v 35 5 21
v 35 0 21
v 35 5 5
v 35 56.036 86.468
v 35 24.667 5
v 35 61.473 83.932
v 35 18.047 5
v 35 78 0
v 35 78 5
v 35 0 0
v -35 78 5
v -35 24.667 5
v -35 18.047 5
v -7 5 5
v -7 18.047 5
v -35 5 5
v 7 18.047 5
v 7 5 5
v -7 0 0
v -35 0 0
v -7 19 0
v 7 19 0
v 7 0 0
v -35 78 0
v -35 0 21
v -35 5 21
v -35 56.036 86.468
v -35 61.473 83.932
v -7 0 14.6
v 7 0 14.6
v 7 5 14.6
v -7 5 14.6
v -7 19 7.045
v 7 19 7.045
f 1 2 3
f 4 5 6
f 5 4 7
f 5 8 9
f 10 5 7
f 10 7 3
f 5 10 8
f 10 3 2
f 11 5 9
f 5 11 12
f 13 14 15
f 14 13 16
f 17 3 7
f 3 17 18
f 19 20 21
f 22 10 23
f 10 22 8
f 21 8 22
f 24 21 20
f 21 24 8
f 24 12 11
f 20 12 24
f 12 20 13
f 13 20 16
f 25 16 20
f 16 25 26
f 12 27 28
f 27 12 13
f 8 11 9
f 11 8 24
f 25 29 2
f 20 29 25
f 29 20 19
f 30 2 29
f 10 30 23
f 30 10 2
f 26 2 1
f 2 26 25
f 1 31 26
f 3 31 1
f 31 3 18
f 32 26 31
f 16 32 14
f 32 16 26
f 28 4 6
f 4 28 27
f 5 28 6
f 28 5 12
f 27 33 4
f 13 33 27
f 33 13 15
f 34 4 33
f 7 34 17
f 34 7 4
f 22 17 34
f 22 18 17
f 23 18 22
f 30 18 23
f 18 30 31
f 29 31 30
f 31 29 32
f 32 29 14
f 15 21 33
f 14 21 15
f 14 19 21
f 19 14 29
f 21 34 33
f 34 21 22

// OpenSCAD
// phone_stand/model.scad — L-profile desk stand: base + front lip + leaning
// back rest, with a cable slot through the lip. Print flat on the base.

w = 70;
depth = 78;
tilt = 65;           // degrees from horizontal; 90 = upright
rest_h = 90;
phone_th = 13;
lip_h = 16;
base_th = 5;
slot_w = 14;
lip_th = 5;
rest_th = 6;

$fn = 48;

// The phone leans on the rest, sitting in the slot between lip and rest.
rest_y = lip_th + phone_th;    // front face of the back rest at base level

module base() {
  translate([-w/2, 0, 0])
    cube([w, depth, base_th]);
}

module lip() {
  translate([-w/2, 0, 0])
    cube([w, lip_th, base_th + lip_h]);
}

module back_rest() {
  translate([0, rest_y, base_th - 0.1])
    rotate([tilt - 90, 0, 0])       // lean the top backwards
      translate([-w/2, 0, 0])
        cube([w, rest_th, rest_h]);
}

difference() {
  union() {
    base();
    lip();
    back_rest();
  }
  // charging-cable slot through the lip and base front, centered
  translate([-slot_w/2, -1, -1])
    cube([slot_w, lip_th + phone_th + 2, base_th + lip_h * 0.6 + 1]);
}
